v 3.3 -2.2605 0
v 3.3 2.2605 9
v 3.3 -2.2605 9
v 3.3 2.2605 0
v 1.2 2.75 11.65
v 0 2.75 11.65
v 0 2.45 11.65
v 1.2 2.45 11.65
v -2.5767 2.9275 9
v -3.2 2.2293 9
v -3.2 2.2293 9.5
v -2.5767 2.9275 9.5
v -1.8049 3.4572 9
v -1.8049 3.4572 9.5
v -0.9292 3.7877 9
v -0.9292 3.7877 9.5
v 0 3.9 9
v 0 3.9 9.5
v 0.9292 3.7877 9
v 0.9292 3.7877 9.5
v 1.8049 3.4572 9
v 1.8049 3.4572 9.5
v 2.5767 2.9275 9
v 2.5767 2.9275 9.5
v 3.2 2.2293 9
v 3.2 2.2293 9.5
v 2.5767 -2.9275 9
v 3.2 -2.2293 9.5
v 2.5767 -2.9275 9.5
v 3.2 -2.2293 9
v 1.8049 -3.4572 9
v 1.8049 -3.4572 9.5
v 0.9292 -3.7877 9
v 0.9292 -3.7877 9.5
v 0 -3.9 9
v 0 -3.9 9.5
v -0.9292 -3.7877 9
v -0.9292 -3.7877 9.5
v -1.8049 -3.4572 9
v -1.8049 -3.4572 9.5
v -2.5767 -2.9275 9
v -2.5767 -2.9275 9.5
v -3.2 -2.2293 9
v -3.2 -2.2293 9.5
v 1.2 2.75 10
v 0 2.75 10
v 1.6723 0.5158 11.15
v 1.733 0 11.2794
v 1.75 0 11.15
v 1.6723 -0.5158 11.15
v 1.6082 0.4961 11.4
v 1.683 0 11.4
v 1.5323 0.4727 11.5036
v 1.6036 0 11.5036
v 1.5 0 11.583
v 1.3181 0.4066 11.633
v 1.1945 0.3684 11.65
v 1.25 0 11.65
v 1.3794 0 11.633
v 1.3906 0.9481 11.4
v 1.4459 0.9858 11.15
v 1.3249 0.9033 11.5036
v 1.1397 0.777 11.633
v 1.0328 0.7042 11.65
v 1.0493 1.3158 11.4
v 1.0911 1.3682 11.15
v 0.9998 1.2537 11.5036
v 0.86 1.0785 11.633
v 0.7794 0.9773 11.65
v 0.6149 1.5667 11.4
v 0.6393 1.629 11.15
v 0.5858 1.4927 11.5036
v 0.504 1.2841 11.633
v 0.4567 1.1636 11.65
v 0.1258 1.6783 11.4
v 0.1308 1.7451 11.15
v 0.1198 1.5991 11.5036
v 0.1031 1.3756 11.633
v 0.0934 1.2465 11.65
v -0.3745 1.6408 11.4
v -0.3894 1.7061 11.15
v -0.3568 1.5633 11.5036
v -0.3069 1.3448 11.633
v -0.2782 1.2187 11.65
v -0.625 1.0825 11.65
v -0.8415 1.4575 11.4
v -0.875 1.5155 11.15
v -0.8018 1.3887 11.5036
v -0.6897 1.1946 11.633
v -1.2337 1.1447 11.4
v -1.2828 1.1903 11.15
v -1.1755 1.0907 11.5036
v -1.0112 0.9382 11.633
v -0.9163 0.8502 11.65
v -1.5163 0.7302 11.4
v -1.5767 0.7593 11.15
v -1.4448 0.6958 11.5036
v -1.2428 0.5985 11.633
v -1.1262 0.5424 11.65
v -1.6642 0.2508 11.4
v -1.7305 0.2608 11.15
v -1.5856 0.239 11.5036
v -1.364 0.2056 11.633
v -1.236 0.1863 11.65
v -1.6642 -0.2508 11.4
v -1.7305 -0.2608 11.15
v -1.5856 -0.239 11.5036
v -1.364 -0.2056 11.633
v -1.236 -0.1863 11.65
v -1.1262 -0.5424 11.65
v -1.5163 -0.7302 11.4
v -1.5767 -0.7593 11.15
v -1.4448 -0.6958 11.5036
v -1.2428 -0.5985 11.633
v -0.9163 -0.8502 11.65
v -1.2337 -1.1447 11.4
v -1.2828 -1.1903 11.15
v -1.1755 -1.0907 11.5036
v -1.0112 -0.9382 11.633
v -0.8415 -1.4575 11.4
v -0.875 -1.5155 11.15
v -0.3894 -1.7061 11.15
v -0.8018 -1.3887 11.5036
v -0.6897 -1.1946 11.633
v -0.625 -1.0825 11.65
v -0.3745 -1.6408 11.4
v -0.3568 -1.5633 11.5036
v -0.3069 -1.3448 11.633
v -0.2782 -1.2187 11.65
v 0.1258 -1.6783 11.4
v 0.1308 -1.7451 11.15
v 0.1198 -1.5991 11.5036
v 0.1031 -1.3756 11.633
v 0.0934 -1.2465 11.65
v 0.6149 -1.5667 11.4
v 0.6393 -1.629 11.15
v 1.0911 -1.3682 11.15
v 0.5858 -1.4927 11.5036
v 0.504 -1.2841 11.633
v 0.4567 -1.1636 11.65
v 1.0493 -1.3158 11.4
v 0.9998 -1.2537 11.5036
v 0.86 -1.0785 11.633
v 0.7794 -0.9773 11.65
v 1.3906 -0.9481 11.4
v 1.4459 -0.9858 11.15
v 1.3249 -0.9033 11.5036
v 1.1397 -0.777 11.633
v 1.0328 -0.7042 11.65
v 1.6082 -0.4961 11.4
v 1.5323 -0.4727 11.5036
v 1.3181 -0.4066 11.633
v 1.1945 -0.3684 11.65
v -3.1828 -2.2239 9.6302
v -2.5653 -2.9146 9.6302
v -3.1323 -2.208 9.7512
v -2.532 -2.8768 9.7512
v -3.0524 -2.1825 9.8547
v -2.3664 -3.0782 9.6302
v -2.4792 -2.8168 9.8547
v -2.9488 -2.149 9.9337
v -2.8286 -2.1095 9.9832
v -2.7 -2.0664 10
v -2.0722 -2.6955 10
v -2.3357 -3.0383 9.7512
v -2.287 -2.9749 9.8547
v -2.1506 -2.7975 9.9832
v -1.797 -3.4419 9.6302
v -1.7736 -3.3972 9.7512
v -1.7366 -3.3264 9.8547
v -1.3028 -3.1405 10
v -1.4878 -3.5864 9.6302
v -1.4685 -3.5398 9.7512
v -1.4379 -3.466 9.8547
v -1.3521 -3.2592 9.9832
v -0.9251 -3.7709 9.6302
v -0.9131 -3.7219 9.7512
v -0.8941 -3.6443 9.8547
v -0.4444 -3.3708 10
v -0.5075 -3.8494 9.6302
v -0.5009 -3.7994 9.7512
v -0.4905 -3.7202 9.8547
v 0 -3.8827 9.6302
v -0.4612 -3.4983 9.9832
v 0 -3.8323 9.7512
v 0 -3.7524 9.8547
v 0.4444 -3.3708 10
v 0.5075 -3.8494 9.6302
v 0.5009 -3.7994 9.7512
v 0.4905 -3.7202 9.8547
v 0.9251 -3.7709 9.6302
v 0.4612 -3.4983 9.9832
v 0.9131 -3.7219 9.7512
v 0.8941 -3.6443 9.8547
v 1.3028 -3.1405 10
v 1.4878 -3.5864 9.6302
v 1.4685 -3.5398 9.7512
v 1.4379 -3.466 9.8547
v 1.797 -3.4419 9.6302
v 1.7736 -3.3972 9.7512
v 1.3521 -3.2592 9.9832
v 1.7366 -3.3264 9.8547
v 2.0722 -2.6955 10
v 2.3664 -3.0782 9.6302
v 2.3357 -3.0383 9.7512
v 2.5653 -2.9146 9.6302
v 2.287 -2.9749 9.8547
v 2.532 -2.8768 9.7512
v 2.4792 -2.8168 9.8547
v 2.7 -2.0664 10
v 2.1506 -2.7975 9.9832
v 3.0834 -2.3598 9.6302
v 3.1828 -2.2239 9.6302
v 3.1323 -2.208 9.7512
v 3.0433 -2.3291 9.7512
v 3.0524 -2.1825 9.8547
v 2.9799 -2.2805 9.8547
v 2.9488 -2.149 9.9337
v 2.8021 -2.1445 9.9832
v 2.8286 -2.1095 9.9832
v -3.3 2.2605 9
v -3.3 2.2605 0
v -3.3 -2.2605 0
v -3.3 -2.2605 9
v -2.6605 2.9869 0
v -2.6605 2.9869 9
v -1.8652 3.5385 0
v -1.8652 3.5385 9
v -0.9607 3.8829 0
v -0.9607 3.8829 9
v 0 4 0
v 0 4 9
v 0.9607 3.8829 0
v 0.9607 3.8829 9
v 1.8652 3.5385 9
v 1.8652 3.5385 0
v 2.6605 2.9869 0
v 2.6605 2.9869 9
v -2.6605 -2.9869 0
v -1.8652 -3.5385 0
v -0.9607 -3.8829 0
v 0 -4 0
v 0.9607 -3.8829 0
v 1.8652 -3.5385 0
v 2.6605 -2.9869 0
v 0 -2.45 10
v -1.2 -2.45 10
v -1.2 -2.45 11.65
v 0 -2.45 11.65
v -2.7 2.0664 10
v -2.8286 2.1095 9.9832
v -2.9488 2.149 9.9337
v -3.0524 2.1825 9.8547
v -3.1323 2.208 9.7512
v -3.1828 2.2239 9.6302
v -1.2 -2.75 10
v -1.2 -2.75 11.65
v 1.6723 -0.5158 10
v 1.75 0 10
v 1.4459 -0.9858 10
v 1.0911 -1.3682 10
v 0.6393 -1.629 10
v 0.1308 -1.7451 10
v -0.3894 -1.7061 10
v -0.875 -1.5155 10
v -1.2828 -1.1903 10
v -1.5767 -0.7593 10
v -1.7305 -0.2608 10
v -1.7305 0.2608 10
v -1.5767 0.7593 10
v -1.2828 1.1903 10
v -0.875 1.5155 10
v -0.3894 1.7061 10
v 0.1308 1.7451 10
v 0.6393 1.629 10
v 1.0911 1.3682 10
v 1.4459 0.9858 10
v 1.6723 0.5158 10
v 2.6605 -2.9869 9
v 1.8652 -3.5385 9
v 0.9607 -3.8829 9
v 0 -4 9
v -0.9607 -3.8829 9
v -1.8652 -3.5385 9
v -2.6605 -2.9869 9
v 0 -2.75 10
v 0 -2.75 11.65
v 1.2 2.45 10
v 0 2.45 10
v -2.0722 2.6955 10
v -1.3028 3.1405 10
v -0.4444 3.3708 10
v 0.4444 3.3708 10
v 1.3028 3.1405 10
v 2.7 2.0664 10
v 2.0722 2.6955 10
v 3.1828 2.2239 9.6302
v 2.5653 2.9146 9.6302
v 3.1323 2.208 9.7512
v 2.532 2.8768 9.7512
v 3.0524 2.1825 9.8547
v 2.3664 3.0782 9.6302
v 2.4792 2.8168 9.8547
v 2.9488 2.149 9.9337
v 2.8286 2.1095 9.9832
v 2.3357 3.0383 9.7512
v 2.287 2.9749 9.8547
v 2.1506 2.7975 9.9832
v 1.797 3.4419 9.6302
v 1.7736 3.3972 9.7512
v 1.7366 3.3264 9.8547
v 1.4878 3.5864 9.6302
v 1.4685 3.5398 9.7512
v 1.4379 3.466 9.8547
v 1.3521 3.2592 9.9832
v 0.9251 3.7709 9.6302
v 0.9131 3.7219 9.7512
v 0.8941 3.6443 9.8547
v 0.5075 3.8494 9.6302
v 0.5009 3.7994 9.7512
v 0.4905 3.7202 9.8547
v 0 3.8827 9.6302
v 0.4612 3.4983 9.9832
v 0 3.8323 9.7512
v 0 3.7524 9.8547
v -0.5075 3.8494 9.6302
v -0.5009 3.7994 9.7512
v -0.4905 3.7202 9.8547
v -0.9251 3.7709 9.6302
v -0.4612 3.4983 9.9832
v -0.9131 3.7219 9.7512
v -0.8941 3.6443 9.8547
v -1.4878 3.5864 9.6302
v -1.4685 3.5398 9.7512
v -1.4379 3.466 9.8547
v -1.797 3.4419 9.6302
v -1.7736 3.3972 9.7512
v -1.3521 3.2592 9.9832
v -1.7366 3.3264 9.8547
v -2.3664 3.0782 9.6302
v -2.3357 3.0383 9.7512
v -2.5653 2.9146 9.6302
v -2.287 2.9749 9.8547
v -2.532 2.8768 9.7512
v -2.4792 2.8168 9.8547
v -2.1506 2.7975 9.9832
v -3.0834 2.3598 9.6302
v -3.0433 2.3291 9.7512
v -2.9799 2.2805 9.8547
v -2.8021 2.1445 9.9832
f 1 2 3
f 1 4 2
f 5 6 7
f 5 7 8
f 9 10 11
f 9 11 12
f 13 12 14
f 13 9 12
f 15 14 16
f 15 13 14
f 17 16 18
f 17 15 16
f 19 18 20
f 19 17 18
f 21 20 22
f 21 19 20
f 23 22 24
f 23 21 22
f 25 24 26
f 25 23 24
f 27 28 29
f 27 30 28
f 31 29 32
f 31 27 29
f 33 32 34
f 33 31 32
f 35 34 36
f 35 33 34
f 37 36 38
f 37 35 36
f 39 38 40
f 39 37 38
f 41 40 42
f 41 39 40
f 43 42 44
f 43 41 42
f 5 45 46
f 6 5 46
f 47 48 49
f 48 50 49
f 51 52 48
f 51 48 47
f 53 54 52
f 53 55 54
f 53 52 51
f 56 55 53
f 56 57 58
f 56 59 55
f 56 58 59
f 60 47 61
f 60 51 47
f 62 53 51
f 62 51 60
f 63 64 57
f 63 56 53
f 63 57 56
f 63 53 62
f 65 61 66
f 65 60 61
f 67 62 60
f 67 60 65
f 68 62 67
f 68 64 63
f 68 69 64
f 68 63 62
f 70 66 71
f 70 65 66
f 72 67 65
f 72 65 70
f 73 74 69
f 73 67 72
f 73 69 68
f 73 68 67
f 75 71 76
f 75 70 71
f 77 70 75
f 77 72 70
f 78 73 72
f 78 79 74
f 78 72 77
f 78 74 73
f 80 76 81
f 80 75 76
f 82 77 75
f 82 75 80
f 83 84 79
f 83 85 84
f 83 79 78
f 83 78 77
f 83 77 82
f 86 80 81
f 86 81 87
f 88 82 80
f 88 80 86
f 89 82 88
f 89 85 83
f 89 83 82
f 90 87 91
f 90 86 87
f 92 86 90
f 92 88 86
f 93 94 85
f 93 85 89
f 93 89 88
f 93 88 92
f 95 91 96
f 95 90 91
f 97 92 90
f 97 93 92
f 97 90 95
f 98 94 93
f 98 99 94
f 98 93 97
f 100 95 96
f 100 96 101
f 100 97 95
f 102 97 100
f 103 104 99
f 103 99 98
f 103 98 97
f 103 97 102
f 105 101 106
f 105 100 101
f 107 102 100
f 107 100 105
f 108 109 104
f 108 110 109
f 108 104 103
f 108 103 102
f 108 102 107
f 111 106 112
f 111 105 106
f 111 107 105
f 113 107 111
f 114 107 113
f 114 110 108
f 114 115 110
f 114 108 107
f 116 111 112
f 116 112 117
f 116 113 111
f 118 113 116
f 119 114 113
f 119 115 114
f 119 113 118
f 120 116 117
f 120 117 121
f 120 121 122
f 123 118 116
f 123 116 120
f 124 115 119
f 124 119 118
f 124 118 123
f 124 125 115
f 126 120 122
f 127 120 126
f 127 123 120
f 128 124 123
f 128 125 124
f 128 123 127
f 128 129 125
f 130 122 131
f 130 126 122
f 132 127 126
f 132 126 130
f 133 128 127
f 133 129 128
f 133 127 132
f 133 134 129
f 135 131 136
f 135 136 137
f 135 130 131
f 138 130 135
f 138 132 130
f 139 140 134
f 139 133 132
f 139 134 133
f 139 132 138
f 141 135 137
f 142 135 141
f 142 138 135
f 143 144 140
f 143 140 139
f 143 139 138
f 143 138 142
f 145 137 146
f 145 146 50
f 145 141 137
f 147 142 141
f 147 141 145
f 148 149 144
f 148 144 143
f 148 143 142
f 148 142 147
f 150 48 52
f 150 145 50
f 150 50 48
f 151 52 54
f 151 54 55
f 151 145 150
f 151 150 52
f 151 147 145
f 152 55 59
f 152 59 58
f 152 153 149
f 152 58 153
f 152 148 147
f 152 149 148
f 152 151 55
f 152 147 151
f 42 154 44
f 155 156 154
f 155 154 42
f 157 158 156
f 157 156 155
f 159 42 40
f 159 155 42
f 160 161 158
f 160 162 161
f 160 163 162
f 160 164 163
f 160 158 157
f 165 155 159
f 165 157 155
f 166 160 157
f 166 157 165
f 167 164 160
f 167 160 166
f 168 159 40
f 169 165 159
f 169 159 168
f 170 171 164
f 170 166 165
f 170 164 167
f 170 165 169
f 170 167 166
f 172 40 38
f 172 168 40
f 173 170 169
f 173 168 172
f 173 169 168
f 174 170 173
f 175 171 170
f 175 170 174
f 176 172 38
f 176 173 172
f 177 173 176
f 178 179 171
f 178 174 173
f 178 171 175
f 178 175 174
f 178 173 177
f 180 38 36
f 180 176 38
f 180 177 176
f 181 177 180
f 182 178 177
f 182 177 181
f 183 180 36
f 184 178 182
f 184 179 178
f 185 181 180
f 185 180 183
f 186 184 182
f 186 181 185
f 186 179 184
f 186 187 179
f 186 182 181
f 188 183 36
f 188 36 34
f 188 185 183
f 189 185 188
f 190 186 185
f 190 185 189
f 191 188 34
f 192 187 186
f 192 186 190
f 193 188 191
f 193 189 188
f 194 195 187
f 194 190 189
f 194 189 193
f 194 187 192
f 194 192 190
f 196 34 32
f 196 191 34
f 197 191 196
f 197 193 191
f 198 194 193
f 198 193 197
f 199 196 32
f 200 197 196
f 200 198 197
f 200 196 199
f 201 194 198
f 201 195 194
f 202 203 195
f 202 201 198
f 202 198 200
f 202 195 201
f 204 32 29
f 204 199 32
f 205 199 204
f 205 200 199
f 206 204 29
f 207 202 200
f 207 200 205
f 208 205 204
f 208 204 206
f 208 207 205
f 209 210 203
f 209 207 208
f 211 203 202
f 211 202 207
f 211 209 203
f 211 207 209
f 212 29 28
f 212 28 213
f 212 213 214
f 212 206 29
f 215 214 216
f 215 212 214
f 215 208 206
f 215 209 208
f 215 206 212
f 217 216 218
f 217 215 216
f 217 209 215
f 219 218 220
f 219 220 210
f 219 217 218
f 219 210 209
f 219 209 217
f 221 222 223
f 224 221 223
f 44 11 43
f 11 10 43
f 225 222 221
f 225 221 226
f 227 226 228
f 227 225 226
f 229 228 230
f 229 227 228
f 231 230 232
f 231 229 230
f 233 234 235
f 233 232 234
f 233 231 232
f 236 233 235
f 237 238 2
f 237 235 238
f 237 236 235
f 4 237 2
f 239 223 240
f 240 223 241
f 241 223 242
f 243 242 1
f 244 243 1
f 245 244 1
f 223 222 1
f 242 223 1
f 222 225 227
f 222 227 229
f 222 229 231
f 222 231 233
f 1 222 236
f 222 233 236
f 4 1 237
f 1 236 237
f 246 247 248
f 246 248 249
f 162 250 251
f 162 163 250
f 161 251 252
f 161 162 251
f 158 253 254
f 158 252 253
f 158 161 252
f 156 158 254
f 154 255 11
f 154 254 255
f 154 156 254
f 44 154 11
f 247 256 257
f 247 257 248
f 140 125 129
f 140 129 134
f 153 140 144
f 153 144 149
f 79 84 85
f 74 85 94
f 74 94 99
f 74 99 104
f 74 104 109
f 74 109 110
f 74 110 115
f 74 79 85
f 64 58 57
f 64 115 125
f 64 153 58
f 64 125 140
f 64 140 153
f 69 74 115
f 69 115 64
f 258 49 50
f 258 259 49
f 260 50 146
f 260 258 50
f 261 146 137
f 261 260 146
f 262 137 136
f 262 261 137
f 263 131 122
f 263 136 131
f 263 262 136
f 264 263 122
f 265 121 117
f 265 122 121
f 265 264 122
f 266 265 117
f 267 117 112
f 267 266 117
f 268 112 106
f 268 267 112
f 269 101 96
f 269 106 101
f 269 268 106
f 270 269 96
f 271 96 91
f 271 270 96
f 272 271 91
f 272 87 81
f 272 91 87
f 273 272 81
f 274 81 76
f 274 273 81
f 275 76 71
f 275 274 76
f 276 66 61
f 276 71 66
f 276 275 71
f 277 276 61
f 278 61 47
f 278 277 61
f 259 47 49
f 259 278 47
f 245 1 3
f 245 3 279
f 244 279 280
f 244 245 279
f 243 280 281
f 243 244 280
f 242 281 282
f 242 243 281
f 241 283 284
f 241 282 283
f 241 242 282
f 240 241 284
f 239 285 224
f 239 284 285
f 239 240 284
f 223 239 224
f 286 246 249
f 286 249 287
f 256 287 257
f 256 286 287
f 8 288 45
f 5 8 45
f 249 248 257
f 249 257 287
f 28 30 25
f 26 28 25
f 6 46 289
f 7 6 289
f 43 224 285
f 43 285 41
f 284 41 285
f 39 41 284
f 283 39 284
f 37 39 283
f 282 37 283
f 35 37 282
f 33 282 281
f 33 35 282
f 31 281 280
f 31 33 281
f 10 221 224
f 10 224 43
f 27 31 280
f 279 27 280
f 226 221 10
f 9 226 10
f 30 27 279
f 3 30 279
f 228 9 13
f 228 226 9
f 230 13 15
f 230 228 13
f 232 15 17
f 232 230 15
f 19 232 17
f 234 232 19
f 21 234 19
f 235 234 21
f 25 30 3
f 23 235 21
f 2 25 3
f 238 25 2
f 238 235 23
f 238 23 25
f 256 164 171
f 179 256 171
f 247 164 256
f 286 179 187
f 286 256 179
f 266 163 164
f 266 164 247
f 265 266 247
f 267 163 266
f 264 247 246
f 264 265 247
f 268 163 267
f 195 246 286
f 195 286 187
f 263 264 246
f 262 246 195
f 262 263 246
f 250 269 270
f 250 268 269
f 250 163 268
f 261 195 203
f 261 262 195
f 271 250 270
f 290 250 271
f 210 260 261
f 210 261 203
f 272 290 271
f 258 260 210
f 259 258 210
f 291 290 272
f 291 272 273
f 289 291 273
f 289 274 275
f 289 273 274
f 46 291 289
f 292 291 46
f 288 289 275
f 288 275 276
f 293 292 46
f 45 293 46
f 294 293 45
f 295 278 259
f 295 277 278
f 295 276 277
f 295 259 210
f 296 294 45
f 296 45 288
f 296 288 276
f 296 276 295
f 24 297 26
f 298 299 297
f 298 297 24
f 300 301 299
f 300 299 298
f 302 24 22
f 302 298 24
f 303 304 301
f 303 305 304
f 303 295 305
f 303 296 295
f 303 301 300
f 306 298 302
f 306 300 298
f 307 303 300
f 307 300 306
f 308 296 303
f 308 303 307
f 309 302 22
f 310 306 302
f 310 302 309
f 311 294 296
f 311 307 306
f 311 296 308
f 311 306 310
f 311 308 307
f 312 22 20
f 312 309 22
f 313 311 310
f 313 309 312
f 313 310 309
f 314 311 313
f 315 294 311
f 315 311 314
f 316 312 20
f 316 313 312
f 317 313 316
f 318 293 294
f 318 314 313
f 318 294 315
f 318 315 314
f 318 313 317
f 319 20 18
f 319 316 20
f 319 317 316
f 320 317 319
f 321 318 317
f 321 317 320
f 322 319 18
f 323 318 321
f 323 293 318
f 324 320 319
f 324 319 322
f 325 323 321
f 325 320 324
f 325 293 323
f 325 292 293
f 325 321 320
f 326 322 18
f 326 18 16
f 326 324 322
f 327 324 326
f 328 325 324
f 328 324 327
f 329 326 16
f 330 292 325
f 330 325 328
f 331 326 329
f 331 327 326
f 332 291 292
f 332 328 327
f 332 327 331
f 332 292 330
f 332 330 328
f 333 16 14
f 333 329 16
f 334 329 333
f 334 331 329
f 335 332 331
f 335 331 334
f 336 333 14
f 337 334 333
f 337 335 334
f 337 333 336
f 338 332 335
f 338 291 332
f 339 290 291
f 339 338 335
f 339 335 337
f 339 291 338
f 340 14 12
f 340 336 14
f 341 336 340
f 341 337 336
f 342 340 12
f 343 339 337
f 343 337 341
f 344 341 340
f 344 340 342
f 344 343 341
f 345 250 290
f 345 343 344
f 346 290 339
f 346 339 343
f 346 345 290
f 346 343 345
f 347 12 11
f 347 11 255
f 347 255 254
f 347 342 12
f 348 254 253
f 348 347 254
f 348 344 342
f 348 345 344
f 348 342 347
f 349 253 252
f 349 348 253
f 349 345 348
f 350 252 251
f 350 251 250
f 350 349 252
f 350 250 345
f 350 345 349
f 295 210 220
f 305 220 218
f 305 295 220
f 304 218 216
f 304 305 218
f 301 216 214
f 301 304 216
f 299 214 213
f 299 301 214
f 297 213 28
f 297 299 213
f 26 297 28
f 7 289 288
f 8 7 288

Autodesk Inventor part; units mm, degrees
ref_plane "YZ Plane" through (0, 0, 0) normal (1, 0, 0) x (0, 1, 0)
ref_plane "XZ Plane" through (0, 0, 0) normal (0, 1, 0) x (-1, 0, 0)
ref_plane "XY Plane" through (0, 0, 0) normal (0, 0, 1) x (1, 0, 0)
sketch "Sketch1" plane through (0, 0, 0) normal (0, 0, 1) x (1, 0, 0)
  point P0 (0, 0)
sketch "Sketch2" plane through (0, 0, 0) normal (0, 0, 1) x (1, 0, 0)
  line L0 (-3.3, 2.2605) -> (-3.3, -2.2605)
  line L1 (3.3, 2.2605) -> (3.3, -2.2605)
  arc A0 (-3.3, -2.2605) -> (3.3, -2.2605) centre (0, 0) ccw
  arc A1 (3.3, 2.2605) -> (-3.3, 2.2605) centre (0, 0) ccw
  dimension "d1" = 6.6
  dimension "d2" = 4
extrude "Extrusion1" add sketch "Sketch2" along normal blind 9
sketch "Sketch3" plane through (0, 0, 9) normal (0, 0, 1) x (1, 0, 0)
  point P0 (0, 0)
sketch "Sketch4" plane through (0, 0, 9) normal (0, 0, 1) x (1, 0, 0)
  line L0 (-3.3, 2.2605) -> (-3.3, -2.2605) projected
  arc A0 (-3.3, -2.2605) -> (3.3, -2.2605) centre (0, 0) ccw projected
  line L1 (3.3, -2.2605) -> (3.3, 2.2605) projected
  arc A1 (3.3, 2.2605) -> (-3.3, 2.2605) centre (0, 0) ccw projected
  line L2 (-3.2, 2.2293) -> (-3.2, -2.2293)
  arc A2 (-3.2, -2.2293) -> (3.2, -2.2293) centre (0, 0) ccw
  line L3 (3.2, -2.2293) -> (3.2, 2.2293)
  arc A3 (3.2, 2.2293) -> (-3.2, 2.2293) centre (0, 0) ccw
  dimension "d5" = 0.1
extrude "Extrusion2" add sketch "Sketch4" along normal blind 1 contours A3 L3 A2 L2
fillet "Fillet1" radius 0.5 4 edges at (3.2, 0, 10) (0, 3.9, 10) (-3.2, 0, 10) (0, -3.9, 10)
sketch "Sketch5" plane through (0, 0, 10) normal (0, 0, 1) x (1, 0, 0)
  circle A0 centre (0, 0) radius 1.75
  dimension "d9" = 3.5
extrude "Extrusion3" add sketch "Sketch5" along normal blind 1.65
fillet "Fillet2" radius 0.5 1 edges at (-1.75, 0, 11.65)
sketch "Sketch6" plane through (0, 0, 10) normal (0, 0, 1) x (1, 0, 0)
  circle A0 centre (0, 0) radius 1.75 projected
  line L0 (0, -2.75) -> (-1.2, -2.75)
  line L1 (-1.2, -2.75) -> (-1.2, -2.45)
  line L2 (-1.2, -2.45) -> (0, -2.45)
  line L3 (0, -2.45) -> (0, -2.75)
  line L4 (0, 2.45) -> (1.2, 2.45)
  line L5 (1.2, 2.45) -> (1.2, 2.75)
  line L6 (1.2, 2.75) -> (0, 2.75)
  line L7 (0, 2.75) -> (0, 2.45)
  point P0 (1.4682, 1.2)
  dimension "d21" = 1.2
  dimension "d22" = 0.3
  dimension "d23" = 1.2
  dimension "d24" = 0.3
  dimension "d25" = 0.7
  dimension "d26" = 0.7
extrude "Extrusion4" add sketch "Sketch6" along normal blind 1.65 contours L0 L1 L2 L3 | L7 L6 L5 L4
properties part number "J024 motor"
